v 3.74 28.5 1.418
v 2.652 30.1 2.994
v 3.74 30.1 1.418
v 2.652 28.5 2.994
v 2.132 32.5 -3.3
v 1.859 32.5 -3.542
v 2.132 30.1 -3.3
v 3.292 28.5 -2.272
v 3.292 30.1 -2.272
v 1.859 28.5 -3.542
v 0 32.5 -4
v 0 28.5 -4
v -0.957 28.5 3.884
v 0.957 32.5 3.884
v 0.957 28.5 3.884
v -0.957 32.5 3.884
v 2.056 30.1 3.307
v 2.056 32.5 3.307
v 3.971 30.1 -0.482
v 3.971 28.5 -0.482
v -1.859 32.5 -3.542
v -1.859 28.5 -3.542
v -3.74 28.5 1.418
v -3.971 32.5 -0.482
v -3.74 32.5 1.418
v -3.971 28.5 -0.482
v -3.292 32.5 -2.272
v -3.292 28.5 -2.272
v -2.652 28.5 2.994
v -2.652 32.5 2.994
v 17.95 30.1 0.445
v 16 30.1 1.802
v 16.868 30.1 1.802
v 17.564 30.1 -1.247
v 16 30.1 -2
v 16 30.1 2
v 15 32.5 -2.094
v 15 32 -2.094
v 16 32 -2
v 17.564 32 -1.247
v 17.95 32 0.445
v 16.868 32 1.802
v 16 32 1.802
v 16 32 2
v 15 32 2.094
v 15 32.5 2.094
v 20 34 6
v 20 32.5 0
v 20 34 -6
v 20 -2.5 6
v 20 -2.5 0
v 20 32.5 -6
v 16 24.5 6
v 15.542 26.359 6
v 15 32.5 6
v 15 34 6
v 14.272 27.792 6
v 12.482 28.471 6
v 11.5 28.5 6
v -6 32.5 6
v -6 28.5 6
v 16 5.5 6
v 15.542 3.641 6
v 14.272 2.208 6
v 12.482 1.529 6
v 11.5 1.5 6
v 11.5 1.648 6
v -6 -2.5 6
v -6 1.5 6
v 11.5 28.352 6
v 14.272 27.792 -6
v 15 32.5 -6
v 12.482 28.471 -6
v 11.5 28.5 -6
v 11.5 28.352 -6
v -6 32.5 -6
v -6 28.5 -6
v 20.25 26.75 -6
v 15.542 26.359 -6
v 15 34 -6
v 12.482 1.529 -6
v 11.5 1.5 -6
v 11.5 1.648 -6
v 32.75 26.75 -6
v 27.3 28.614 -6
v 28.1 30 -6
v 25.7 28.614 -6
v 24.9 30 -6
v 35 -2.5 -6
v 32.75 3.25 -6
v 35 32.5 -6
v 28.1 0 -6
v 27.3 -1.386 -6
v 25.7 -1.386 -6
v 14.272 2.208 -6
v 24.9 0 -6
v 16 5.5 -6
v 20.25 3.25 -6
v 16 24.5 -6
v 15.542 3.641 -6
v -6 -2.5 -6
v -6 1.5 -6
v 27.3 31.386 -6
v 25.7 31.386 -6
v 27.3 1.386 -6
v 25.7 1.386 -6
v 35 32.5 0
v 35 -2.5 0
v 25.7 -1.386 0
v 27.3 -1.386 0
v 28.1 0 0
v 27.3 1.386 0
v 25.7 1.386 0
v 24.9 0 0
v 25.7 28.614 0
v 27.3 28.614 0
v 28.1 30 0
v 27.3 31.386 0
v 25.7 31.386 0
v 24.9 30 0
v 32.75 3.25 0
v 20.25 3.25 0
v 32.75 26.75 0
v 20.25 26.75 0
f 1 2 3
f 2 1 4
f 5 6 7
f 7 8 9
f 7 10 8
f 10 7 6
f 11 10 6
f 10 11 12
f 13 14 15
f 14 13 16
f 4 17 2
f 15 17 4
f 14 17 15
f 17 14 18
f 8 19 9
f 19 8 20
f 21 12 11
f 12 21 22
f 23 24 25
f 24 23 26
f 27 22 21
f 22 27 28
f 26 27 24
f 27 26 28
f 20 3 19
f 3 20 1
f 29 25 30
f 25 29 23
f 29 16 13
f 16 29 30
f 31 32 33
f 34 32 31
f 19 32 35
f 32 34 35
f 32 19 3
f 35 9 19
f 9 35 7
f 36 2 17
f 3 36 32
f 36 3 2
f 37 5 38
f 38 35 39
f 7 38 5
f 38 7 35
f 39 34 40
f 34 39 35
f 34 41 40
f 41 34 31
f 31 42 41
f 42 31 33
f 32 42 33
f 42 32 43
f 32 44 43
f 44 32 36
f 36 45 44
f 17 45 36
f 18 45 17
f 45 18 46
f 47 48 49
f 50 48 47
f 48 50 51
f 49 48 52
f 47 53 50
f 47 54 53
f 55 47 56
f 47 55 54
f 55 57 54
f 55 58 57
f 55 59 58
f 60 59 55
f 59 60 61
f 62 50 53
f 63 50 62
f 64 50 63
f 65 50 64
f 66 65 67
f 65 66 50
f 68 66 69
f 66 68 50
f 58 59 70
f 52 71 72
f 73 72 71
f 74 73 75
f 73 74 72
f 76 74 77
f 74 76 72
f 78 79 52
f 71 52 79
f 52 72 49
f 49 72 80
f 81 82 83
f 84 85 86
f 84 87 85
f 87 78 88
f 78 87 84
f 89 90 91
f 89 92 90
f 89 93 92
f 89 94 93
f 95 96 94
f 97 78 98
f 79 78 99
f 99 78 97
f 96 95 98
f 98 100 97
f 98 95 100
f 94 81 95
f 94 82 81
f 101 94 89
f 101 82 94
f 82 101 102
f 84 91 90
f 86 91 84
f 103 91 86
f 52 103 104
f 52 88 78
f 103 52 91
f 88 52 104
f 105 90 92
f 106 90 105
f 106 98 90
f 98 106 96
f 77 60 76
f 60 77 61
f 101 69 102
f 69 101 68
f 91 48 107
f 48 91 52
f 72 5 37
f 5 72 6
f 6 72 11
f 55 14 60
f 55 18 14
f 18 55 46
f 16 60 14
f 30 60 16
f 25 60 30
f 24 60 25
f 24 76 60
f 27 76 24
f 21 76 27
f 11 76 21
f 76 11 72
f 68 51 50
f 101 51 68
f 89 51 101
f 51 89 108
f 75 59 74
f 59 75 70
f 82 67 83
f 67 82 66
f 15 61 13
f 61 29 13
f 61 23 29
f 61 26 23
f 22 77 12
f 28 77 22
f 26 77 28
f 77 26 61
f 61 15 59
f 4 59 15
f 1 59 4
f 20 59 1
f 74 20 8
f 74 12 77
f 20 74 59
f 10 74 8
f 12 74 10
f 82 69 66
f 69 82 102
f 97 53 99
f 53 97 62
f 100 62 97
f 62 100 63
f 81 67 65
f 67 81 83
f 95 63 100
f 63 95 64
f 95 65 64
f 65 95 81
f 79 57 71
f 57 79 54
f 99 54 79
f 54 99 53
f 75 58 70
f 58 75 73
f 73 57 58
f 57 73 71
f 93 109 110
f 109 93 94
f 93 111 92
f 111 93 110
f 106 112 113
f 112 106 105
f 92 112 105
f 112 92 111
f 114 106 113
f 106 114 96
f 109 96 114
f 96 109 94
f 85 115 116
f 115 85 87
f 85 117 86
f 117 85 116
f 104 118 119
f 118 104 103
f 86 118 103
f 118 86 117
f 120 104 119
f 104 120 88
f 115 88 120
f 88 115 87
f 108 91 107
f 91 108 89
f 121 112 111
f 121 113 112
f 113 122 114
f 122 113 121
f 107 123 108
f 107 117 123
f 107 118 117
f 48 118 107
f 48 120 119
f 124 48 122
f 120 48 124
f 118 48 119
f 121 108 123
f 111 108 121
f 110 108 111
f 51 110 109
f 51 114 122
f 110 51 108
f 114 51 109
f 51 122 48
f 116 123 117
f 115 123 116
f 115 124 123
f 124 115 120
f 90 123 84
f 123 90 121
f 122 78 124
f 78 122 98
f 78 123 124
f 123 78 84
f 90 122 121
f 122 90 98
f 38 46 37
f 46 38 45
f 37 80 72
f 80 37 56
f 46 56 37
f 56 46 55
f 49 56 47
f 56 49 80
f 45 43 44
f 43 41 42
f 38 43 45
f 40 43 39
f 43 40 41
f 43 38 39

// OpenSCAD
// file: servo_arm.scad
module servo_arm(body_r = 8/2, arm_r1 = 7/2, arm_r2 = 4/2, arm_len = 16, arm_t = 2.5, body_t = 7) {
	cylinder(r = body_r, h = body_t);
	
	linear_extrude(height = arm_t) {
		circle(r = arm_r1);
		translate([0,arm_len,0]) circle(r = arm_r2);
		polygon(points = [ [-arm_r1, 0], [arm_r1, 0], [arm_r2, arm_len], [-arm_r2, arm_len] ]);
	}
}
// file: servo.scad
// 3dof quad
//
// servo



module servo(a = 30, b = 23, c = 27, d = 12, e = 33, f = 16, flange_thickness = 2, top_cap_pct = 0.5) {
	rem_height = c - flange_thickness - f;
	top_cap_height = rem_height * top_cap_pct;
	roundel_height = rem_height * (1.0 - top_cap_pct);	

	translate([0, -d/2, 0]) union() {
		translate([0,0,flange_thickness/2]) cube([d, e, flange_thickness], center = true);
		translate([0,0,-f/2]) cube([d, b, f], center = true);
		translate([0,0,flange_thickness + top_cap_height/2]) cube([d, b, top_cap_height], center = true);
		translate([0,b/2 - d/2,flange_thickness + top_cap_height]) union() {
			cylinder(r = d/2, h = roundel_height);
			translate([0,0,roundel_height]) cylinder(r = 3, h = 3);
		}
	}
}

//color("blue") servo();
// main file
// 3dof quad 
//
// coxa

include <servo.scad>
include <servo_arm.scad>

module coxa(servo_height = 27, servo_clearance = 7) {
	arm_thick = 4;
	servo_width = 12;
	flange_length = 3;
	base_thick = 4;
	root_radius = 4;
	block(servo_width);
	fork_width = servo_width + flange_length + servo_clearance + base_thick;
	fork_height = arm_thick * 2 + servo_height;
	
	servo_cog_offset = 6;

	translate([fork_width/2 - servo_cog_offset, 0, 0]) union() {
		difference() {
			cube([fork_width, fork_height, 12], center = true);
			translate([-root_radius/2 - base_thick/2 - 1, 0, 0]) cube([1 + servo_width + flange_length + servo_clearance - root_radius, servo_height, 13], center = true);
			translate([-base_thick/2, 0, 0]) cube([servo_width + flange_length + servo_clearance, servo_height-2*root_radius, 13], center = true);
			translate([5, -9.5, 0]) cylinder(r = root_radius, h = 13, center = true);	
			translate([5, 9.5, 0]) cylinder(r = root_radius, h = 13, center = true);	
			color("white") translate([servo_cog_offset - fork_width/2, 0.1 + fork_height/2, 0]) rotate([90, 90, 0]) servo_arm();
		}

		translate([fork_width/2 + 15/2, 0, -3]) {
			difference() {	
				cube([15, fork_height, 6], center = true);
				translate([-1, 0, 0]) cube([12.5, 23.5, 7], center = true);
				for(i = [-1, 1]) {
					translate([-1, i * 30/2, 0]) cylinder(r=1.6, h=20, center = true);
				}
			}
		}
	}

}


module block(servo_width)
{
	translate([15, 17, -6])
	{
		cube([5, 2, servo_width]);
	}
}
translate([0,15,0]) coxa(); 
//scale([-1, 1, 1]) coxa();
